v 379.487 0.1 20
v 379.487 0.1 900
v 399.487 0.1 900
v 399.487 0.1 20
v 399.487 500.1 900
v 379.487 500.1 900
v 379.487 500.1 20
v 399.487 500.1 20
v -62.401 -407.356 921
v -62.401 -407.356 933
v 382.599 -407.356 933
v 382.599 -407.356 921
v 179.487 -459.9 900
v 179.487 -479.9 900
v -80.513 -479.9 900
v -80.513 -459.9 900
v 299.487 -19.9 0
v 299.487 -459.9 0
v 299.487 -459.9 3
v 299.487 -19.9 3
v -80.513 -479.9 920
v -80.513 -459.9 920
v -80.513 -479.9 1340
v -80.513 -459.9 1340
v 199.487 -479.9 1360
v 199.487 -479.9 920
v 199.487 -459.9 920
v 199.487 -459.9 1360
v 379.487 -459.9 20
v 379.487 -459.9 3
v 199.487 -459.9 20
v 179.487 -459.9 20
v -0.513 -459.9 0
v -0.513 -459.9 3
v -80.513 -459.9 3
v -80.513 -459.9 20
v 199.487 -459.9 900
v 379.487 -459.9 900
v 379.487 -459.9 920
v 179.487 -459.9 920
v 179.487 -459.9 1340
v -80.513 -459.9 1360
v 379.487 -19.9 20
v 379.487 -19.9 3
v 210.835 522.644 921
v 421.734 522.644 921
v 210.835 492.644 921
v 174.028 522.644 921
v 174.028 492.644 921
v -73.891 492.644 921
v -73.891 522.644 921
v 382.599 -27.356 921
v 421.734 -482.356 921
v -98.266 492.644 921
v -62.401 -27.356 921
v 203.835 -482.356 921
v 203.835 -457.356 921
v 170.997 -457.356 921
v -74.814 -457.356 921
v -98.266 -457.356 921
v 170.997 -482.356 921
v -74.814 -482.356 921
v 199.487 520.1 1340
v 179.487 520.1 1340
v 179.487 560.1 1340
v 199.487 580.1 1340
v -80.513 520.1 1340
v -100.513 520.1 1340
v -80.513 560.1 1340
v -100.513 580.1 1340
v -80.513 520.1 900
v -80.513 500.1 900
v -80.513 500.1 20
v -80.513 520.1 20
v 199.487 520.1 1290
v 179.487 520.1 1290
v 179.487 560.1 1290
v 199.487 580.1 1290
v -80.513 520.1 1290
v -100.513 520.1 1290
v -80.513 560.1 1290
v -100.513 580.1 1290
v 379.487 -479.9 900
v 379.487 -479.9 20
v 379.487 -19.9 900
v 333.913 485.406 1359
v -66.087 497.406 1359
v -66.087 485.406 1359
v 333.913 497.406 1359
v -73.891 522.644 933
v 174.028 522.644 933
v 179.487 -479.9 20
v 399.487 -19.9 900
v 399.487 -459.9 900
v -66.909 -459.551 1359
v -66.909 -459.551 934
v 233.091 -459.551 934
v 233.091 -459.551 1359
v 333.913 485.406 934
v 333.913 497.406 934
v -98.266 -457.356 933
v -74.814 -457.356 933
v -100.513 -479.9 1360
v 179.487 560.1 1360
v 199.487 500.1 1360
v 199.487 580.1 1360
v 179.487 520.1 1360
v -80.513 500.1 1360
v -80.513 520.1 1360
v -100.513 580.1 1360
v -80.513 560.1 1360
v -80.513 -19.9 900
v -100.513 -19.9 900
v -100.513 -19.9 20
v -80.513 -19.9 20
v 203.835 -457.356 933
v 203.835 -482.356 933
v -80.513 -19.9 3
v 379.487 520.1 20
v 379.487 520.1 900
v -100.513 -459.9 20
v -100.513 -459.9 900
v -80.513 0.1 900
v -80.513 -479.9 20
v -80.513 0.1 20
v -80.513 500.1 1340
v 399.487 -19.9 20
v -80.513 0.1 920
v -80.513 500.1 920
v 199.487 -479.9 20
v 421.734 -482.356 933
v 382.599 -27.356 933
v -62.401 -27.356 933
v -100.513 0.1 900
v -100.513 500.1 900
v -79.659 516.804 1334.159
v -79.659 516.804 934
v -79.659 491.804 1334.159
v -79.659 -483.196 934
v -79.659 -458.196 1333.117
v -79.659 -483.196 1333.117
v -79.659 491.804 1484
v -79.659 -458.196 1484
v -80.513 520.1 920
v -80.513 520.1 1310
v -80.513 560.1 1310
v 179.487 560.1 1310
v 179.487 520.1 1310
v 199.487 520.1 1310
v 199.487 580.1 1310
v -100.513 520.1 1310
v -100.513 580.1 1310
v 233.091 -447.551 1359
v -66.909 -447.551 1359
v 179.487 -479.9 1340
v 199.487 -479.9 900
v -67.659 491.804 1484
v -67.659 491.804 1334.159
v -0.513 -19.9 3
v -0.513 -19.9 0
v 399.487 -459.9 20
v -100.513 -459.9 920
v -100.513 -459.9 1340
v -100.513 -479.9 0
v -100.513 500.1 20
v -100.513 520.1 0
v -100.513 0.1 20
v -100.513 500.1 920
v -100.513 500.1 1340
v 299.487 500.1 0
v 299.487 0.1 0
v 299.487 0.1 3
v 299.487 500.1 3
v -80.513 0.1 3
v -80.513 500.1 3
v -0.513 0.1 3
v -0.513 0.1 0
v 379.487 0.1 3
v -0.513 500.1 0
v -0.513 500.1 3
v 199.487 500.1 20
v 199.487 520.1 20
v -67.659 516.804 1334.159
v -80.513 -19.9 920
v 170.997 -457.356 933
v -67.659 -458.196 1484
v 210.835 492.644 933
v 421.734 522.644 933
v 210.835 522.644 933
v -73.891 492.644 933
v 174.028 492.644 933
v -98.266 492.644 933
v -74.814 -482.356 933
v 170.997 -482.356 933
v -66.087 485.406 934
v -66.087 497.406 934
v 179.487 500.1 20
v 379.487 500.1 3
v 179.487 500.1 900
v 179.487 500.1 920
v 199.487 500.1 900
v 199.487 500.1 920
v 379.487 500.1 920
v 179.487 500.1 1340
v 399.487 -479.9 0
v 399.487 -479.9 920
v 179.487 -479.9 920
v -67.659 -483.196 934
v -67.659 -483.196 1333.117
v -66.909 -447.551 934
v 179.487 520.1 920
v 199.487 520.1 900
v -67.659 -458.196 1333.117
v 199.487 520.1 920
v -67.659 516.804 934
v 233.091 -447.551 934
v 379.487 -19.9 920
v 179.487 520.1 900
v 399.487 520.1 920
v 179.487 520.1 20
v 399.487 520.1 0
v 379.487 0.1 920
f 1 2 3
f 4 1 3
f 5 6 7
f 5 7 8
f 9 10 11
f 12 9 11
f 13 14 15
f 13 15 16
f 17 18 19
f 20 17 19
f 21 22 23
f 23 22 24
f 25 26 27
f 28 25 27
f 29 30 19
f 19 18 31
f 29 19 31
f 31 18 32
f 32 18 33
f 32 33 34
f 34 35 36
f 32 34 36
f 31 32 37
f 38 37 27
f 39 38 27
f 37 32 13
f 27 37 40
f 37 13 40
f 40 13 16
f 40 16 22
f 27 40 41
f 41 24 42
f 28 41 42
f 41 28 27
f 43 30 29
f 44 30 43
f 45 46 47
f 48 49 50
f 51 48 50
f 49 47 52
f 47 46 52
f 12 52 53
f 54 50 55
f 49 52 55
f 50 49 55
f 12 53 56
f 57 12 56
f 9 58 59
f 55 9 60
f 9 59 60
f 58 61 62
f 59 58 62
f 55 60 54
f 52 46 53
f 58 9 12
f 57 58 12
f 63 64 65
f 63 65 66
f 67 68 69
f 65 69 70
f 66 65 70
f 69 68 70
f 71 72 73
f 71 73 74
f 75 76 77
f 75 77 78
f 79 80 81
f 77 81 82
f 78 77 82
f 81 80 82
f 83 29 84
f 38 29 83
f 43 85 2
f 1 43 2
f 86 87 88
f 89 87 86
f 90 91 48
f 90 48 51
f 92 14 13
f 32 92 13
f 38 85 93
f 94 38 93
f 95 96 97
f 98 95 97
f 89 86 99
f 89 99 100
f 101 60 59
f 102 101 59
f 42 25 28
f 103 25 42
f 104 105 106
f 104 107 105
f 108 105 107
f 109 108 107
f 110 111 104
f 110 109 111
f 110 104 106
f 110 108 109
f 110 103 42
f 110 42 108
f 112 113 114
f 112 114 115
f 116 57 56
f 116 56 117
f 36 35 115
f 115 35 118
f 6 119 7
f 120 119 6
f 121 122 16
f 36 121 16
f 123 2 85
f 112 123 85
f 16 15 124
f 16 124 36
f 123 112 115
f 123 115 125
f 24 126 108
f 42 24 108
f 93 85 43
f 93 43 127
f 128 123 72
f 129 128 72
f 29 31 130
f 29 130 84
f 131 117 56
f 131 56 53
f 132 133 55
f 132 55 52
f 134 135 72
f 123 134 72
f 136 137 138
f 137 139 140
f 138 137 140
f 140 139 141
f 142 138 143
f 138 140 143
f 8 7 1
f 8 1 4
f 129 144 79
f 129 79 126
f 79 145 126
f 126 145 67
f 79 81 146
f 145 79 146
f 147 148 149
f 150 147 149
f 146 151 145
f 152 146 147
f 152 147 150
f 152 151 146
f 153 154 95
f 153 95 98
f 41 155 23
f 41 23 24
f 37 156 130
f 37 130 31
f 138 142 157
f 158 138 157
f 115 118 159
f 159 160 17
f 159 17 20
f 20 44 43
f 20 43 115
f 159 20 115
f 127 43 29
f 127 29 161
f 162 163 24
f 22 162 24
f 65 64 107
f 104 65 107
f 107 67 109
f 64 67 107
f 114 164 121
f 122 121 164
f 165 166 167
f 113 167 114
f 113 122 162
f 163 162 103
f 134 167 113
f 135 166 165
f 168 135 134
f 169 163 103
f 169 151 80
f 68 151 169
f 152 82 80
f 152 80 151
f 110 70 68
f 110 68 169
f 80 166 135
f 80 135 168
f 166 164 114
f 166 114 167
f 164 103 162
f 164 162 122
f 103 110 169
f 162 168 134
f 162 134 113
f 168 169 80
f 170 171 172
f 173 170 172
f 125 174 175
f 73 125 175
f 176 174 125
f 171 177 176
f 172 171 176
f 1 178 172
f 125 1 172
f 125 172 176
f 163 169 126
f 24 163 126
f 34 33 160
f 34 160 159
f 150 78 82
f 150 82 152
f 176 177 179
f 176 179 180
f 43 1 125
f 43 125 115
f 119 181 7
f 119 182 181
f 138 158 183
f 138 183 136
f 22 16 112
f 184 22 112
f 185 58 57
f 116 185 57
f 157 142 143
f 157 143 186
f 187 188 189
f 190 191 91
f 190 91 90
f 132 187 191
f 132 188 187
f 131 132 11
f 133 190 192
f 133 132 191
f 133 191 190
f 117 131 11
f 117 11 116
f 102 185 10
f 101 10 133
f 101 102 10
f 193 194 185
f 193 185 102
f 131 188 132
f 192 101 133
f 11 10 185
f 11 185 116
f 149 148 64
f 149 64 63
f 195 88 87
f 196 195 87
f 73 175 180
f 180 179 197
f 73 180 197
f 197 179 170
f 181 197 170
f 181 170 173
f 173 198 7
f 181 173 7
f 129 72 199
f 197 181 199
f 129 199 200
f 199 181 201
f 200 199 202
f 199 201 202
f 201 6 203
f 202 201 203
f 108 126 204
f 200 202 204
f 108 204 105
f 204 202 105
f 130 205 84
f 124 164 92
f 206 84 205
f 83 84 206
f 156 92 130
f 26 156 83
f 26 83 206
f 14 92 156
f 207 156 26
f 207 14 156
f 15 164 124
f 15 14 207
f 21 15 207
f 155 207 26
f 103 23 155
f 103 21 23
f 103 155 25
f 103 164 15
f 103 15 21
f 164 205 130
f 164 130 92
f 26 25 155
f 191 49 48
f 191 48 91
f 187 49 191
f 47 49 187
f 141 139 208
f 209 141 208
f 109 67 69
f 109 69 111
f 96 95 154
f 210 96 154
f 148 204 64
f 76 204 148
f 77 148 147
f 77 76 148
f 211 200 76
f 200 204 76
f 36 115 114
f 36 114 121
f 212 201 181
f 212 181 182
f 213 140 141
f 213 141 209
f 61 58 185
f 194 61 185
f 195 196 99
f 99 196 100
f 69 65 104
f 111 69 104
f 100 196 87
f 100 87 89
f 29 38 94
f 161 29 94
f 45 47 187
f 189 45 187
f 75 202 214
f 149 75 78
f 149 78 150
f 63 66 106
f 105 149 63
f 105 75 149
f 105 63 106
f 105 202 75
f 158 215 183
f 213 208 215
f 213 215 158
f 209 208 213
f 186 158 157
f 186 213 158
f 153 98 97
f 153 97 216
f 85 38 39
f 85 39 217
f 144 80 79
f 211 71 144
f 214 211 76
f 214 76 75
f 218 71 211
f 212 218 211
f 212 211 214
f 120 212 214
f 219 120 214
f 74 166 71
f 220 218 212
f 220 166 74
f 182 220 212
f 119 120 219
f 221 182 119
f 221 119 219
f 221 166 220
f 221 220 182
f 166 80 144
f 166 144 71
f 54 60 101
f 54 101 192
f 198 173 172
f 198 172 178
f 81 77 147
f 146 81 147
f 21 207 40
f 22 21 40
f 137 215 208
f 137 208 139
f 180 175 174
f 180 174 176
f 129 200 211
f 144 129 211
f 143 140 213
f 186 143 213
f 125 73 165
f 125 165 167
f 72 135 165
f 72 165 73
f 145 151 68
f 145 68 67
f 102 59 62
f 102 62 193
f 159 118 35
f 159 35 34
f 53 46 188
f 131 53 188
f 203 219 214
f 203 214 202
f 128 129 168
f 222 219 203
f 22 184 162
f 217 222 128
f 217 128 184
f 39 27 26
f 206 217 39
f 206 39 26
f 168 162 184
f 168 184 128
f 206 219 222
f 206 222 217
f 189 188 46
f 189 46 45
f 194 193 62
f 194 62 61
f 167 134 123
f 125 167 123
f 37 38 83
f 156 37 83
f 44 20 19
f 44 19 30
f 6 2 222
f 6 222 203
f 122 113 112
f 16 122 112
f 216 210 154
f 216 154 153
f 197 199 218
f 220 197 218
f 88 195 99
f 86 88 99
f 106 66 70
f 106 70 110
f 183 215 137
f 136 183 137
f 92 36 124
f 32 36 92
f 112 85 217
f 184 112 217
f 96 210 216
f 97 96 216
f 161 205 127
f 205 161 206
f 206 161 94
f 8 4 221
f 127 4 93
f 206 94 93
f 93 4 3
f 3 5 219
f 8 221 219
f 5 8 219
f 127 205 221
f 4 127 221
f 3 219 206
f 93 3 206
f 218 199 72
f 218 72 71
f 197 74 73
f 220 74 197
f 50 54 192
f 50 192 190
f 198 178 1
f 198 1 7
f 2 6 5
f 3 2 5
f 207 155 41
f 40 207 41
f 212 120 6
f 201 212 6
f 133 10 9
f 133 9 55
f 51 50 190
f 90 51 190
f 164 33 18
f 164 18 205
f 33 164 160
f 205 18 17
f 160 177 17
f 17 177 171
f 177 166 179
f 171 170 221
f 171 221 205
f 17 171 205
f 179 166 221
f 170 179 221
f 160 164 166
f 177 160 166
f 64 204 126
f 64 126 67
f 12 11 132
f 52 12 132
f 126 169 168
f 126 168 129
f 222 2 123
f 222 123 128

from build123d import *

# Parameters (mm, degrees)
F0_W      = 500
F0_H      = 1000
F0_W_2    = 460
F0_H_2    = 960
F1_DEPTH  = 20
F2_W      = 20
F2_H      = 20
F3_DEPTH  = 1340
F4_W      = 20
F4_H      = 20
F5_DEPTH  = 900
F6_W      = 20
F6_H      = 20
F7_DEPTH  = 960
F8_W      = 20
F8_H      = 20
F9_DEPTH  = 180
F10_W     = 20
F10_H     = 20
F11_DEPTH = 880
F12_W     = 20
F12_H     = 20
F13_DEPTH = 460
F14_W     = 20
F14_H     = 20
F15_DEPTH = 960
F16_W     = 20
F16_H     = 20
F17_DEPTH = 260
F18_W     = 20
F18_H     = 20
F19_DEPTH = 880
F20_W     = 20
F20_H     = 20
F21_DEPTH = 460
F22_W     = 20
F22_H     = 20
F23_DEPTH = 960
F24_W     = 20
F24_H     = 20
F25_DEPTH = 260
F26_W     = 20
F26_H     = 20
F27_DEPTH = 60
F28_W     = 20
F28_H     = 20
F29_DEPTH = 260
F30_W     = 80
F30_H     = 3
F31_DEPTH = 500
F32_W     = 80
F32_H     = 3
F33_DEPTH = 440
F34_W     = 20
F34_H     = 20
F35_DEPTH = 260
F37_W     = 520
F37_H     = 950
F38_DEPTH = 12
F39_W     = 445
F39_H     = 380
F40_DEPTH = 25
F41_W     = 245.8116933703
F41_H     = 12
F41_W_2   = 217.8999376297
F42_DEPTH = 25
F43_W     = 210.899476409
F43_H     = 12
F43_W_2   = 247.9199171066
F44_DEPTH = 30
F46_W     = 12
F46_H     = 950
F47_DEPTH = 550
F48_W     = 12
F48_H     = 399.1171274185
F49_DEPTH = 25
F50_W     = 400
F50_H     = 12
F51_DEPTH = 425
F52_W     = 12
F52_H     = 400.1586589813
F53_DEPTH = 25
F54_W     = 300
F54_H     = 12
F55_DEPTH = 425


with BuildPart() as f1:
    # F0 (on Top) → F1 (new body)
    with BuildSketch(Plane.XY):
        with Locations((149.4873911142, 20.100149343)):
            Rectangle(F0_W, F0_H)
        with Locations((149.4873911142, 20.100149343)):
            Rectangle(F0_W_2, F0_H_2, mode=Mode.SUBTRACT)
    extrude(amount=F1_DEPTH)

    # F2 (on face) → F3 (join)
    with BuildSketch(Plane.XY.offset(20)):
        with Locations((-90.5126088858, 510.100149343)):
            Rectangle(F2_W, F2_H)
        with Locations((-90.5126088858, -469.899850657)):
            Rectangle(F2_W, F2_H)
        with Locations((189.4873911142, -469.899850657)):
            Rectangle(F2_W, F2_H)
        with Locations((189.4873911142, 510.100149343)):
            Rectangle(F2_W, F2_H)
    extrude(amount=F3_DEPTH)

    # F4 (on face) → F5 (join)
    with BuildSketch(Plane.XY.offset(20)):
        with Locations((389.4873911142, 510.100149343)):
            Rectangle(F4_W, F4_H)
        with Locations((389.4873911142, -469.899850657)):
            Rectangle(F4_W, F4_H)
    extrude(amount=F5_DEPTH)

    # F6 (on face) → F7 (join, through all)
    with BuildSketch(Plane.XZ.offset(-500.100149343)):
        with Locations((389.4873911142, 910)):
            Rectangle(F6_W, F6_H)
    extrude(amount=F7_DEPTH)

    # F8 (on face) → F9 (join, through all)
    with BuildSketch(Plane(origin=(379.4873911142, 0, 0), x_dir=(0, -1, 0), z_dir=(-1, 0, 0))):
        with Locations((469.899850657, 910)):
            Rectangle(F8_W, F8_H)
        with Locations((-510.100149343, 910)):
            Rectangle(F8_W, F8_H)
    extrude(amount=F9_DEPTH)

    # F10 (on face) → F11 (join, through all)
    with BuildSketch(Plane.XY.offset(20)):
        with Locations((389.4873911142, -9.899850657)):
            Rectangle(F10_W, F10_H)
    extrude(amount=F11_DEPTH)

    # F12 (on face) → F13 (join, through all)
    with BuildSketch(Plane(origin=(379.4873911142, 0, 0), x_dir=(0, -1, 0), z_dir=(-1, 0, 0))):
        with Locations((9.899850657, 10)):
            Rectangle(F12_W, F12_H)
    extrude(amount=F13_DEPTH)

    # F14 (on face) → F15 (join, through all)
    with BuildSketch(Plane.XZ.offset(-500.100149343)):
        with Locations((-90.5126088858, 910)):
            Rectangle(F14_W, F14_H)
    extrude(amount=F15_DEPTH)

    # F16 (on face) → F17 (join, through all)
    with BuildSketch(Plane.YZ.offset(-80.5126088858)):
        with Locations((-469.899850657, 910)):
            Rectangle(F16_W, F16_H)
        with Locations((510.100149343, 910)):
            Rectangle(F16_W, F16_H)
    extrude(amount=F17_DEPTH)

    # F18 (on face) → F19 (join, through all)
    with BuildSketch(Plane.XY.offset(20)):
        with Locations((-90.5126088858, -9.899850657)):
            Rectangle(F18_W, F18_H)
    extrude(amount=F19_DEPTH)

    # F20 (on face) → F21 (join, through all)
    with BuildSketch(Plane(origin=(379.4873911142, 0, 0), x_dir=(0, -1, 0), z_dir=(-1, 0, 0))):
        with Locations((9.899850657, 910)):
            Rectangle(F20_W, F20_H)
    extrude(amount=F21_DEPTH)

    # F22 (on face) → F23 (join, through all)
    with BuildSketch(Plane.XZ.offset(-500.100149343)):
        with Locations((-90.5126088858, 1350)):
            Rectangle(F22_W, F22_H)
    extrude(amount=F23_DEPTH)

    # F24 (on face) → F25 (join, through all)
    with BuildSketch(Plane.YZ.offset(-80.5126088858)):
        with Locations((-469.899850657, 1350)):
            Rectangle(F24_W, F24_H)
        with Locations((510.100149343, 1350)):
            Rectangle(F24_W, F24_H)
    extrude(amount=F25_DEPTH)

    # F26 (on face) → F27 (join)
    with BuildSketch(Plane(origin=(0, 520.100149343, 0), x_dir=(-1, 0, 0), z_dir=(0, 1, 0))):
        with Locations((-189.4873911142, 1350)):
            Rectangle(F26_W, F26_H)
        with Locations((90.5126088858, 1350)):
            Rectangle(F26_W, F26_H)
        with Locations((-189.4873911142, 1300)):
            Rectangle(F26_W, F26_H)
        with Locations((90.5126088858, 1300)):
            Rectangle(F26_W, F26_H)
    extrude(amount=F27_DEPTH)

    # F28 (on face) → F29 (join, through all)
    with BuildSketch(Plane.YZ.offset(-80.5126088858)):
        with Locations((570.100149343, 1350)):
            Rectangle(F28_W, F28_H)
    extrude(amount=F29_DEPTH)

    # F30 (on face) → F31 (join, through all)
    with BuildSketch(Plane.XZ.offset(-500.100149343)):
        with Locations((339.4873911142, 1.5)):
            Rectangle(F30_W, F30_H)
        with Locations((-40.5126088858, 1.5)):
            Rectangle(F30_W, F30_H)
    extrude(amount=F31_DEPTH)

    # F32 (on face) → F33 (join, through all)
    with BuildSketch(Plane.XZ.offset(19.899850657)):
        with Locations((339.4873911142, 1.5)):
            Rectangle(F32_W, F32_H)
        with Locations((-40.5126088858, 1.5)):
            Rectangle(F32_W, F32_H)
    extrude(amount=F33_DEPTH)

    # F34 (on face) → F35 (join, through all)
    with BuildSketch(Plane.YZ.offset(-80.5126088858)):
        with Locations((570.100149343, 1300)):
            Rectangle(F34_W, F34_H)
    extrude(amount=F35_DEPTH)


with BuildPart() as f38:
    # F37 (on offset) → F38 (new body)
    with BuildSketch(Plane.XY.offset(921)):
        with Locations((161.7344564199, 17.6442921162)):
            Rectangle(F37_W, F37_H)
    extrude(amount=F38_DEPTH)

    # F39 (on face) → F40 (cut)
    with BuildSketch(Plane.XY.offset(933)):
        with Locations((160.0988378877, -217.3557078838)):
            Rectangle(F39_W, F39_H)
    extrude(amount=-F40_DEPTH, mode=Mode.SUBTRACT)

    # F41 (on face) → F42 (join)
    with BuildSketch(Plane.XZ.offset(457.3557078838)):
        with Locations((48.0913855135, 927)):
            Rectangle(F41_W, F41_H)
        with Locations((312.7844876051, 927)):
            Rectangle(F41_W_2, F41_H)
    extrude(amount=F42_DEPTH)

    # F43 (on face) → F44 (join)
    with BuildSketch(Plane(origin=(0, 492.6442921162, 0), x_dir=(-1, 0, 0), z_dir=(0, 1, 0))):
        with Locations((-316.2847182155, 927)):
            Rectangle(F43_W, F43_H)
        with Locations((-50.0684678555, 927)):
            Rectangle(F43_W_2, F43_H)
    extrude(amount=F44_DEPTH)


with BuildPart() as f47:
    # F46 (on offset) → F47 (new body)
    with BuildSketch(Plane.XY.offset(934)):
        with Locations((-73.6587392688, 16.8040454388)):
            Rectangle(F46_W, F46_H)
    extrude(amount=F47_DEPTH)

    # F48 (on face) → F49 (join)
    with BuildSketch(Plane.XZ.offset(458.1959545612)):
        with Locations((-73.6587392688, 1133.5585637093)):
            Rectangle(F48_W, F48_H)
    extrude(amount=F49_DEPTH)

    # F52 (on face) → F53 (join)
    with BuildSketch(Plane(origin=(0, 491.8040454388, 0), x_dir=(-1, 0, 0), z_dir=(0, 1, 0))):
        with Locations((73.6587392688, 1134.0793294907)):
            Rectangle(F52_W, F52_H)
    extrude(amount=F53_DEPTH)


with BuildPart() as f51:
    # F50 (on offset) → F51 (new body)
    with BuildSketch(Plane.XY.offset(934)):
        with Locations((133.9127615094, 491.4055588245)):
            Rectangle(F50_W, F50_H)
    extrude(amount=F51_DEPTH)


with BuildPart() as f55:
    # F54 (on offset) → F55 (new body)
    with BuildSketch(Plane.XY.offset(934)):
        with Locations((83.0905154347, -453.5512151718)):
            Rectangle(F54_W, F54_H)
    extrude(amount=F55_DEPTH)


solid = Compound([f1.part, f38.part, f47.part, f51.part, f55.part])
